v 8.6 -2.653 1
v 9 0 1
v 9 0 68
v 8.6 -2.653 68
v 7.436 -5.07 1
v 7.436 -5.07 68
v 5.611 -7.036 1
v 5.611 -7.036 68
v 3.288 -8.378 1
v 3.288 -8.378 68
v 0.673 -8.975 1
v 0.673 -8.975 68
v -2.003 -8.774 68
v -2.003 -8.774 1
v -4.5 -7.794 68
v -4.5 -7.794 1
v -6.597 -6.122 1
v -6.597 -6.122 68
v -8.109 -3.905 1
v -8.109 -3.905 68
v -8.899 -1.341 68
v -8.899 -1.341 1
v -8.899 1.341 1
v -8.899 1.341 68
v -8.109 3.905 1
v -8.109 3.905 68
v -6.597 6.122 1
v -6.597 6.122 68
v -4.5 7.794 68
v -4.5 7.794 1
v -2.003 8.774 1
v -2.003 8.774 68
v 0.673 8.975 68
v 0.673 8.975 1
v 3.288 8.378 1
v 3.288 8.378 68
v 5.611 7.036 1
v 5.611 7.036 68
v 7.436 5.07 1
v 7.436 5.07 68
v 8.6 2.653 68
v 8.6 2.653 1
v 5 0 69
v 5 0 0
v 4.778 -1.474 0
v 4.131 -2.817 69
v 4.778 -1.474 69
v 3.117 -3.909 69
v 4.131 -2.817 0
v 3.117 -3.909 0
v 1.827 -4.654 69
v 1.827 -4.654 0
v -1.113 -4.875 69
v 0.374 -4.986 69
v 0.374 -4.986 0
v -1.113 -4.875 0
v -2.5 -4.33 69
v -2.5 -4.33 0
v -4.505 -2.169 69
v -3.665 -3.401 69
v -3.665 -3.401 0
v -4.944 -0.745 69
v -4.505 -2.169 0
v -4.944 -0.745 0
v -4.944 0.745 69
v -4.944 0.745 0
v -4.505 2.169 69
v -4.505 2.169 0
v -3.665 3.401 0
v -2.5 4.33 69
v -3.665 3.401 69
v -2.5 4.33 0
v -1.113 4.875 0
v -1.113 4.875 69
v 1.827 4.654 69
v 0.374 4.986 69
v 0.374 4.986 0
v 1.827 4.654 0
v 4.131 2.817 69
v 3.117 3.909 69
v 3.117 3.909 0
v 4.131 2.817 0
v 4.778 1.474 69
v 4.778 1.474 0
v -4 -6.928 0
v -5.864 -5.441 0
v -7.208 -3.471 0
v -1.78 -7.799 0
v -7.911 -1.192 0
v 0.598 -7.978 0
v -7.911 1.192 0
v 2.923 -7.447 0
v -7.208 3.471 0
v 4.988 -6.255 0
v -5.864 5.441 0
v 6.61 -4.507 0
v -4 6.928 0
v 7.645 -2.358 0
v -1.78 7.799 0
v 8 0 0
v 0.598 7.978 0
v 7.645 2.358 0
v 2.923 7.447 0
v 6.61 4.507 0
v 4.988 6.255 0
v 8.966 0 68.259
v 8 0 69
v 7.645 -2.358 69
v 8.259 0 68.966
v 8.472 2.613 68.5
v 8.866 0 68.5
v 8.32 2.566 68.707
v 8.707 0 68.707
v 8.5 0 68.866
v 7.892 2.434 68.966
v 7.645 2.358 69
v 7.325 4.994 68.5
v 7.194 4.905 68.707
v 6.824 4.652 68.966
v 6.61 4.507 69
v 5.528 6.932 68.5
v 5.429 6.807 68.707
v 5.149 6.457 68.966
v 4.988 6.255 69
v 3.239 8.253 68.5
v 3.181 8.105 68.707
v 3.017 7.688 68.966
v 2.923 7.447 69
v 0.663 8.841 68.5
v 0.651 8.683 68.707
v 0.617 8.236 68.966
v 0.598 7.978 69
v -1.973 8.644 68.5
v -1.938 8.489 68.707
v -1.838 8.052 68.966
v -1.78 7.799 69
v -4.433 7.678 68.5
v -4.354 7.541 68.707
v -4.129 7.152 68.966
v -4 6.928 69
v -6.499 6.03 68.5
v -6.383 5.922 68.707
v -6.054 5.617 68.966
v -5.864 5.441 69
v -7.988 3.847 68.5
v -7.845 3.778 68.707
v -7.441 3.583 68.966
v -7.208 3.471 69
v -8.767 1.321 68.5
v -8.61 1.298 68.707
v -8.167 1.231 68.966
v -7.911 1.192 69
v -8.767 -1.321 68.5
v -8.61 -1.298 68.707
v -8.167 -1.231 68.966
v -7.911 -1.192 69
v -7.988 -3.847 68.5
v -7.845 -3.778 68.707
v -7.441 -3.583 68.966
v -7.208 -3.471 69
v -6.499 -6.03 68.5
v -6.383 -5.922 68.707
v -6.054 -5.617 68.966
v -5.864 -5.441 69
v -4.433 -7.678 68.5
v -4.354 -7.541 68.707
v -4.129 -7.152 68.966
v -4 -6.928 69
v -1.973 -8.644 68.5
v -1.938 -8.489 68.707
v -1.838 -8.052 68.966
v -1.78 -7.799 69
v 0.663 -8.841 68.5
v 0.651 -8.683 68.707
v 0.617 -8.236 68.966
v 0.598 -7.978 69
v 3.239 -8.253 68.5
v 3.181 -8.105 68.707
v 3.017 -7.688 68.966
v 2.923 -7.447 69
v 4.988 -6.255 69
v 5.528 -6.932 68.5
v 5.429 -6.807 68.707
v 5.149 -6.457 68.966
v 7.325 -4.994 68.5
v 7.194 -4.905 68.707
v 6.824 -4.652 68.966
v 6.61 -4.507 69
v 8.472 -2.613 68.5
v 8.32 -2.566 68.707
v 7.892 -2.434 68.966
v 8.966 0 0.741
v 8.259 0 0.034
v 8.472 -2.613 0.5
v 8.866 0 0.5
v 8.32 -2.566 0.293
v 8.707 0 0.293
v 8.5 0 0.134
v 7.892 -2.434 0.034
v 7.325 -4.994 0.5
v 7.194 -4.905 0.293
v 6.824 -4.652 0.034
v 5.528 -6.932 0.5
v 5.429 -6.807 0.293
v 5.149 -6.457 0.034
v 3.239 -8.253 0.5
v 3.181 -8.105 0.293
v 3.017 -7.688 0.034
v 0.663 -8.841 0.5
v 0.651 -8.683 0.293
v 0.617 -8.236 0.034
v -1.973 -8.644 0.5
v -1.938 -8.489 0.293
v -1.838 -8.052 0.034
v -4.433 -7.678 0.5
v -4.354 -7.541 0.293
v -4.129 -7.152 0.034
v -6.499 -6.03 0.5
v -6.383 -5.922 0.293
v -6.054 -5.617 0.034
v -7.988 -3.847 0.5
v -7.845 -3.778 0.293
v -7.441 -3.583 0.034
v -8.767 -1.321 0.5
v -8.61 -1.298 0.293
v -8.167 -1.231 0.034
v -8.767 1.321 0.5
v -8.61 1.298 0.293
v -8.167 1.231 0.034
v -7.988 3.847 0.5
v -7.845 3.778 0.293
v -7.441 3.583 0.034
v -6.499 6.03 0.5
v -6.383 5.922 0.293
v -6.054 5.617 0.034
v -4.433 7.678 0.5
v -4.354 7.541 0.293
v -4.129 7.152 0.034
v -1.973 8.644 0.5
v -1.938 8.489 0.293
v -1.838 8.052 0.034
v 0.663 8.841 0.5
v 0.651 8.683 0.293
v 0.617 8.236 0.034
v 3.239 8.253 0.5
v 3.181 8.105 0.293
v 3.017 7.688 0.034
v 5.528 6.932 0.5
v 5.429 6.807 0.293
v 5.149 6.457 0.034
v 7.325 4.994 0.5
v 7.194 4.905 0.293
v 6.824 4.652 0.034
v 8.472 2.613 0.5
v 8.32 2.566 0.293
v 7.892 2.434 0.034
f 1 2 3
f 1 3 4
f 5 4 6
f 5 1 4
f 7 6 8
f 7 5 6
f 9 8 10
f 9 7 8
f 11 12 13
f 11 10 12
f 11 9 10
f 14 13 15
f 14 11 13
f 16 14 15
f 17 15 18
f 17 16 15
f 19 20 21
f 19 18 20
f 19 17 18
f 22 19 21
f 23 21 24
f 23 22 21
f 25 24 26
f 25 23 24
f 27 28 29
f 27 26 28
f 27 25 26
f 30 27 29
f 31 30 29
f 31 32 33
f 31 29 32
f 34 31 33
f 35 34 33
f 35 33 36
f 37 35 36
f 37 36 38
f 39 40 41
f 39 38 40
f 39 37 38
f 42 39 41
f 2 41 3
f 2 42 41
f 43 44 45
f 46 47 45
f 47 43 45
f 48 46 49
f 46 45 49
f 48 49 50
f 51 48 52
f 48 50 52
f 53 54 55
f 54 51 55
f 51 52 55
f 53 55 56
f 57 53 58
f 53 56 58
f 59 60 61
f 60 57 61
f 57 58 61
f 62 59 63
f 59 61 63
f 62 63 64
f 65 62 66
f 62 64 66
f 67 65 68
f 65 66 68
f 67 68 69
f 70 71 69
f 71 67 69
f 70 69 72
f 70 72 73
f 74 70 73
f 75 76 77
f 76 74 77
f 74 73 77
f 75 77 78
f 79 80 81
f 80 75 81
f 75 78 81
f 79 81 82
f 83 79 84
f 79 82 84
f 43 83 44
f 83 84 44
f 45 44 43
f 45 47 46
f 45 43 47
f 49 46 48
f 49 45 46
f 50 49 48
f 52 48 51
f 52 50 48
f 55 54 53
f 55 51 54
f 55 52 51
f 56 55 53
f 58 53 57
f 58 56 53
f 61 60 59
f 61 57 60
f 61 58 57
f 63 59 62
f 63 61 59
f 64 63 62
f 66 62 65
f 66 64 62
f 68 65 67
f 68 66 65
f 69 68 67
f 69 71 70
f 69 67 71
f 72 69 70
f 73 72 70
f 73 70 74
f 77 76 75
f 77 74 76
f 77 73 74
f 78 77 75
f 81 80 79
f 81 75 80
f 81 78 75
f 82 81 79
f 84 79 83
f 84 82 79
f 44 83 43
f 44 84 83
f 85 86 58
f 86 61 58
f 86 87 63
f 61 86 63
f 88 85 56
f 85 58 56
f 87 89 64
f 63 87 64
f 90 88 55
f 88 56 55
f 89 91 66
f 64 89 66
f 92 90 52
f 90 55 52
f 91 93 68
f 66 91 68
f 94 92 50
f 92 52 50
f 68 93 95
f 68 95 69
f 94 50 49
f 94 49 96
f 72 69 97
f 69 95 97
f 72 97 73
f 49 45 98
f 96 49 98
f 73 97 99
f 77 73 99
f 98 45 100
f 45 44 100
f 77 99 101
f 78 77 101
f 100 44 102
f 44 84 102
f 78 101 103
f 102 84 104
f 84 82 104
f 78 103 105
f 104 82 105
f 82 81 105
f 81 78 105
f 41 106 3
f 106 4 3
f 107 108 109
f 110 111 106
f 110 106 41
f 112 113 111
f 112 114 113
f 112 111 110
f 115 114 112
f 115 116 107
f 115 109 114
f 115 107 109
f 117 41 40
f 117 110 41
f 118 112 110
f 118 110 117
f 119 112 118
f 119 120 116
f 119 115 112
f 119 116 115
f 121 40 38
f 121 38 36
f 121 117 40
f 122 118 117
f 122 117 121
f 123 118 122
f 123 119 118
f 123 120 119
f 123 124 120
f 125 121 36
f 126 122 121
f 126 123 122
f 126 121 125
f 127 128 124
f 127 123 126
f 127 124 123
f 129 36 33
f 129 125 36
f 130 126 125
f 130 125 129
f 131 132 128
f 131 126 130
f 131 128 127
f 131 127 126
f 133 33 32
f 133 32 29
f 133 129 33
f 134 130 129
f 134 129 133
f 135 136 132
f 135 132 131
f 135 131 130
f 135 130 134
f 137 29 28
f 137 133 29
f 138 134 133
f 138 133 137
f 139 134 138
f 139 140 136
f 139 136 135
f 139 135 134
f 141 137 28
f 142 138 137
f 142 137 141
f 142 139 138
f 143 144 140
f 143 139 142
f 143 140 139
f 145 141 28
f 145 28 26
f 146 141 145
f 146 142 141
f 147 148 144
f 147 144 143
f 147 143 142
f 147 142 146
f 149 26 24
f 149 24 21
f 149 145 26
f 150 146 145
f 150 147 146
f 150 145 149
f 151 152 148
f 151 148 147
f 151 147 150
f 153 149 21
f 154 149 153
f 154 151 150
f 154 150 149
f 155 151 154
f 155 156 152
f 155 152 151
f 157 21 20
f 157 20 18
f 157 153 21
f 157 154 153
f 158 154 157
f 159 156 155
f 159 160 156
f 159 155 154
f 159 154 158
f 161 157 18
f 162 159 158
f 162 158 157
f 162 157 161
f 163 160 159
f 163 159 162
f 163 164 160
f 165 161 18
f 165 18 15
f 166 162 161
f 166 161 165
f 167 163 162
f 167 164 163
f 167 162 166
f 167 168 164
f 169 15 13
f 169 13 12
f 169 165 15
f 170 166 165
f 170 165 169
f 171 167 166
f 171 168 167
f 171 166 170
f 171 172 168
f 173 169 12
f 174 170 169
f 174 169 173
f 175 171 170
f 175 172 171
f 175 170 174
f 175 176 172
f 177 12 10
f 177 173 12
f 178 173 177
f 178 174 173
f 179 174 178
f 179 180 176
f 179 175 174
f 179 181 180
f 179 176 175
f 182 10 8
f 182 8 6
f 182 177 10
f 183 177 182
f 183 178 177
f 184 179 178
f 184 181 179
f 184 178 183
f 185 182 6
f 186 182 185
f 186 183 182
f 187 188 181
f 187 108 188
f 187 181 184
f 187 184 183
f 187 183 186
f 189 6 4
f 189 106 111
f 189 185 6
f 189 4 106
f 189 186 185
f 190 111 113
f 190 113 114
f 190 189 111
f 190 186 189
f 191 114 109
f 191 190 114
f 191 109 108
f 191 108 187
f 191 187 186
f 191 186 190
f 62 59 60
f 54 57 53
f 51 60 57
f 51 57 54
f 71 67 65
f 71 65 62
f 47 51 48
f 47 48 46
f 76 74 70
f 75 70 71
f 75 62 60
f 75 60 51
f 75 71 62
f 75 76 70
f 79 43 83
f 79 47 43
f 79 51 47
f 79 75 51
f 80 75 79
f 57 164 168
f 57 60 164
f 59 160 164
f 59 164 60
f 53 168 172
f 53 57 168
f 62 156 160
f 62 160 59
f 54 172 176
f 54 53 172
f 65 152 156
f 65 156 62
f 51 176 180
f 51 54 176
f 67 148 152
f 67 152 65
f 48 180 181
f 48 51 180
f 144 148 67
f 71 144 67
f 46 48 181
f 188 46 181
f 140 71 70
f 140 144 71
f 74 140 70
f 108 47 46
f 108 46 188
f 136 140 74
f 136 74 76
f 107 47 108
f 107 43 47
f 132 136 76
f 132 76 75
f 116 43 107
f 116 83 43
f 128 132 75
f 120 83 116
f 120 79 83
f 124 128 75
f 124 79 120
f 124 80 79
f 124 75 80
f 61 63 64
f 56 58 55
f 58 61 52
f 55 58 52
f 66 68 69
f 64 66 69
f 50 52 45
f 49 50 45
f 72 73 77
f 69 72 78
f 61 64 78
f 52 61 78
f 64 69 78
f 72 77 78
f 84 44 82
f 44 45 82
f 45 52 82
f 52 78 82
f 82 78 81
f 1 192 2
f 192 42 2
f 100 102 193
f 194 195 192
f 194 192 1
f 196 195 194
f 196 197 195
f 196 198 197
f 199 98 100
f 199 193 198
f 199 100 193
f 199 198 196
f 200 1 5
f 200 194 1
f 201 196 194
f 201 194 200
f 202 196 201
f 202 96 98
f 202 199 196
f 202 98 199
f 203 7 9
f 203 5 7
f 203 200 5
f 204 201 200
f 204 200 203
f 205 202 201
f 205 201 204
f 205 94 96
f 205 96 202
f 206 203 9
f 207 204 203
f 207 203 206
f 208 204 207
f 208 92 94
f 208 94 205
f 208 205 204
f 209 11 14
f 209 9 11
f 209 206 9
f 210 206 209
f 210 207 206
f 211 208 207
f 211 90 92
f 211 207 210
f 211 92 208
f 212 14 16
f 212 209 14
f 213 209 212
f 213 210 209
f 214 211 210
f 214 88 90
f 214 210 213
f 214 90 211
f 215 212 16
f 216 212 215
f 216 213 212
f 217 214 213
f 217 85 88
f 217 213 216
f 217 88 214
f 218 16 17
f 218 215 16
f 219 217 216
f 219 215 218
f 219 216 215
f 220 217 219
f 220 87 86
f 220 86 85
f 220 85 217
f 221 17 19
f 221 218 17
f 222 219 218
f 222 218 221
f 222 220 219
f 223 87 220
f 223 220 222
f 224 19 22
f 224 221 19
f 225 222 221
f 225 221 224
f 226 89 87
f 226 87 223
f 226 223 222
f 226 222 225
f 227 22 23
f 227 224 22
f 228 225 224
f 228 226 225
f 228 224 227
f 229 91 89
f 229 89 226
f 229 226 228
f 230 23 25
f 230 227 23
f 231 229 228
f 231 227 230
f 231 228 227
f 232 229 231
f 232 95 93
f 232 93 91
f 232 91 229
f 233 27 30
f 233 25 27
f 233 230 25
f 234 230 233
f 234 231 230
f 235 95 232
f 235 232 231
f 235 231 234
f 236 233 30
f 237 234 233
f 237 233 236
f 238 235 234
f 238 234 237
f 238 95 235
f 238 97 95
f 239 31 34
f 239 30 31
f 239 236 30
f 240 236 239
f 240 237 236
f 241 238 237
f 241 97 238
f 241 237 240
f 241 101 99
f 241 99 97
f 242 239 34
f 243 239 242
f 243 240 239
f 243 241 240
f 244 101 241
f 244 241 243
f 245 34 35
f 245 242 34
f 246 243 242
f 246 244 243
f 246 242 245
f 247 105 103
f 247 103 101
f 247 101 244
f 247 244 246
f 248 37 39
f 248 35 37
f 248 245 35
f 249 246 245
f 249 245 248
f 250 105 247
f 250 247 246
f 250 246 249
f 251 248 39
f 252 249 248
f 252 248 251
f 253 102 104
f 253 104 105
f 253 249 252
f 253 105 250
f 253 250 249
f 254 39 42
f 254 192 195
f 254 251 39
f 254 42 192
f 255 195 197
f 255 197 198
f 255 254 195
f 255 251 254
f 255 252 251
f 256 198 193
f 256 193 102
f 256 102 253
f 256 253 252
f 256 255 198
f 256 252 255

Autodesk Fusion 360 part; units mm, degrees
sketch "Sketch1" plane through (0, 0, 0) normal (0, 0, 1) x (1, 0, 0)
  circle A0 centre (0, 0) radius 9
  circle A1 centre (0, 0) radius 5
  dimension "d1" = 18
  dimension "d5" = 10
extrude "Extrude1" add sketch "Sketch1" along normal blind 69 contours A0 | A1 makes body 1
fillet "Fillet1" radius 1 2 edges at (-8.3909, -3.2545, 69) (-8.3909, -3.2545, 0) on bodies 1
extrude "Extrude2" cut sketch "Sketch1" along normal up to surface (69 mm away) contours A1 bodies 1
extrude "Extrude3" add sketch "Sketch1" along normal up to surface (69 mm away) separate body contours A1 makes body 2
